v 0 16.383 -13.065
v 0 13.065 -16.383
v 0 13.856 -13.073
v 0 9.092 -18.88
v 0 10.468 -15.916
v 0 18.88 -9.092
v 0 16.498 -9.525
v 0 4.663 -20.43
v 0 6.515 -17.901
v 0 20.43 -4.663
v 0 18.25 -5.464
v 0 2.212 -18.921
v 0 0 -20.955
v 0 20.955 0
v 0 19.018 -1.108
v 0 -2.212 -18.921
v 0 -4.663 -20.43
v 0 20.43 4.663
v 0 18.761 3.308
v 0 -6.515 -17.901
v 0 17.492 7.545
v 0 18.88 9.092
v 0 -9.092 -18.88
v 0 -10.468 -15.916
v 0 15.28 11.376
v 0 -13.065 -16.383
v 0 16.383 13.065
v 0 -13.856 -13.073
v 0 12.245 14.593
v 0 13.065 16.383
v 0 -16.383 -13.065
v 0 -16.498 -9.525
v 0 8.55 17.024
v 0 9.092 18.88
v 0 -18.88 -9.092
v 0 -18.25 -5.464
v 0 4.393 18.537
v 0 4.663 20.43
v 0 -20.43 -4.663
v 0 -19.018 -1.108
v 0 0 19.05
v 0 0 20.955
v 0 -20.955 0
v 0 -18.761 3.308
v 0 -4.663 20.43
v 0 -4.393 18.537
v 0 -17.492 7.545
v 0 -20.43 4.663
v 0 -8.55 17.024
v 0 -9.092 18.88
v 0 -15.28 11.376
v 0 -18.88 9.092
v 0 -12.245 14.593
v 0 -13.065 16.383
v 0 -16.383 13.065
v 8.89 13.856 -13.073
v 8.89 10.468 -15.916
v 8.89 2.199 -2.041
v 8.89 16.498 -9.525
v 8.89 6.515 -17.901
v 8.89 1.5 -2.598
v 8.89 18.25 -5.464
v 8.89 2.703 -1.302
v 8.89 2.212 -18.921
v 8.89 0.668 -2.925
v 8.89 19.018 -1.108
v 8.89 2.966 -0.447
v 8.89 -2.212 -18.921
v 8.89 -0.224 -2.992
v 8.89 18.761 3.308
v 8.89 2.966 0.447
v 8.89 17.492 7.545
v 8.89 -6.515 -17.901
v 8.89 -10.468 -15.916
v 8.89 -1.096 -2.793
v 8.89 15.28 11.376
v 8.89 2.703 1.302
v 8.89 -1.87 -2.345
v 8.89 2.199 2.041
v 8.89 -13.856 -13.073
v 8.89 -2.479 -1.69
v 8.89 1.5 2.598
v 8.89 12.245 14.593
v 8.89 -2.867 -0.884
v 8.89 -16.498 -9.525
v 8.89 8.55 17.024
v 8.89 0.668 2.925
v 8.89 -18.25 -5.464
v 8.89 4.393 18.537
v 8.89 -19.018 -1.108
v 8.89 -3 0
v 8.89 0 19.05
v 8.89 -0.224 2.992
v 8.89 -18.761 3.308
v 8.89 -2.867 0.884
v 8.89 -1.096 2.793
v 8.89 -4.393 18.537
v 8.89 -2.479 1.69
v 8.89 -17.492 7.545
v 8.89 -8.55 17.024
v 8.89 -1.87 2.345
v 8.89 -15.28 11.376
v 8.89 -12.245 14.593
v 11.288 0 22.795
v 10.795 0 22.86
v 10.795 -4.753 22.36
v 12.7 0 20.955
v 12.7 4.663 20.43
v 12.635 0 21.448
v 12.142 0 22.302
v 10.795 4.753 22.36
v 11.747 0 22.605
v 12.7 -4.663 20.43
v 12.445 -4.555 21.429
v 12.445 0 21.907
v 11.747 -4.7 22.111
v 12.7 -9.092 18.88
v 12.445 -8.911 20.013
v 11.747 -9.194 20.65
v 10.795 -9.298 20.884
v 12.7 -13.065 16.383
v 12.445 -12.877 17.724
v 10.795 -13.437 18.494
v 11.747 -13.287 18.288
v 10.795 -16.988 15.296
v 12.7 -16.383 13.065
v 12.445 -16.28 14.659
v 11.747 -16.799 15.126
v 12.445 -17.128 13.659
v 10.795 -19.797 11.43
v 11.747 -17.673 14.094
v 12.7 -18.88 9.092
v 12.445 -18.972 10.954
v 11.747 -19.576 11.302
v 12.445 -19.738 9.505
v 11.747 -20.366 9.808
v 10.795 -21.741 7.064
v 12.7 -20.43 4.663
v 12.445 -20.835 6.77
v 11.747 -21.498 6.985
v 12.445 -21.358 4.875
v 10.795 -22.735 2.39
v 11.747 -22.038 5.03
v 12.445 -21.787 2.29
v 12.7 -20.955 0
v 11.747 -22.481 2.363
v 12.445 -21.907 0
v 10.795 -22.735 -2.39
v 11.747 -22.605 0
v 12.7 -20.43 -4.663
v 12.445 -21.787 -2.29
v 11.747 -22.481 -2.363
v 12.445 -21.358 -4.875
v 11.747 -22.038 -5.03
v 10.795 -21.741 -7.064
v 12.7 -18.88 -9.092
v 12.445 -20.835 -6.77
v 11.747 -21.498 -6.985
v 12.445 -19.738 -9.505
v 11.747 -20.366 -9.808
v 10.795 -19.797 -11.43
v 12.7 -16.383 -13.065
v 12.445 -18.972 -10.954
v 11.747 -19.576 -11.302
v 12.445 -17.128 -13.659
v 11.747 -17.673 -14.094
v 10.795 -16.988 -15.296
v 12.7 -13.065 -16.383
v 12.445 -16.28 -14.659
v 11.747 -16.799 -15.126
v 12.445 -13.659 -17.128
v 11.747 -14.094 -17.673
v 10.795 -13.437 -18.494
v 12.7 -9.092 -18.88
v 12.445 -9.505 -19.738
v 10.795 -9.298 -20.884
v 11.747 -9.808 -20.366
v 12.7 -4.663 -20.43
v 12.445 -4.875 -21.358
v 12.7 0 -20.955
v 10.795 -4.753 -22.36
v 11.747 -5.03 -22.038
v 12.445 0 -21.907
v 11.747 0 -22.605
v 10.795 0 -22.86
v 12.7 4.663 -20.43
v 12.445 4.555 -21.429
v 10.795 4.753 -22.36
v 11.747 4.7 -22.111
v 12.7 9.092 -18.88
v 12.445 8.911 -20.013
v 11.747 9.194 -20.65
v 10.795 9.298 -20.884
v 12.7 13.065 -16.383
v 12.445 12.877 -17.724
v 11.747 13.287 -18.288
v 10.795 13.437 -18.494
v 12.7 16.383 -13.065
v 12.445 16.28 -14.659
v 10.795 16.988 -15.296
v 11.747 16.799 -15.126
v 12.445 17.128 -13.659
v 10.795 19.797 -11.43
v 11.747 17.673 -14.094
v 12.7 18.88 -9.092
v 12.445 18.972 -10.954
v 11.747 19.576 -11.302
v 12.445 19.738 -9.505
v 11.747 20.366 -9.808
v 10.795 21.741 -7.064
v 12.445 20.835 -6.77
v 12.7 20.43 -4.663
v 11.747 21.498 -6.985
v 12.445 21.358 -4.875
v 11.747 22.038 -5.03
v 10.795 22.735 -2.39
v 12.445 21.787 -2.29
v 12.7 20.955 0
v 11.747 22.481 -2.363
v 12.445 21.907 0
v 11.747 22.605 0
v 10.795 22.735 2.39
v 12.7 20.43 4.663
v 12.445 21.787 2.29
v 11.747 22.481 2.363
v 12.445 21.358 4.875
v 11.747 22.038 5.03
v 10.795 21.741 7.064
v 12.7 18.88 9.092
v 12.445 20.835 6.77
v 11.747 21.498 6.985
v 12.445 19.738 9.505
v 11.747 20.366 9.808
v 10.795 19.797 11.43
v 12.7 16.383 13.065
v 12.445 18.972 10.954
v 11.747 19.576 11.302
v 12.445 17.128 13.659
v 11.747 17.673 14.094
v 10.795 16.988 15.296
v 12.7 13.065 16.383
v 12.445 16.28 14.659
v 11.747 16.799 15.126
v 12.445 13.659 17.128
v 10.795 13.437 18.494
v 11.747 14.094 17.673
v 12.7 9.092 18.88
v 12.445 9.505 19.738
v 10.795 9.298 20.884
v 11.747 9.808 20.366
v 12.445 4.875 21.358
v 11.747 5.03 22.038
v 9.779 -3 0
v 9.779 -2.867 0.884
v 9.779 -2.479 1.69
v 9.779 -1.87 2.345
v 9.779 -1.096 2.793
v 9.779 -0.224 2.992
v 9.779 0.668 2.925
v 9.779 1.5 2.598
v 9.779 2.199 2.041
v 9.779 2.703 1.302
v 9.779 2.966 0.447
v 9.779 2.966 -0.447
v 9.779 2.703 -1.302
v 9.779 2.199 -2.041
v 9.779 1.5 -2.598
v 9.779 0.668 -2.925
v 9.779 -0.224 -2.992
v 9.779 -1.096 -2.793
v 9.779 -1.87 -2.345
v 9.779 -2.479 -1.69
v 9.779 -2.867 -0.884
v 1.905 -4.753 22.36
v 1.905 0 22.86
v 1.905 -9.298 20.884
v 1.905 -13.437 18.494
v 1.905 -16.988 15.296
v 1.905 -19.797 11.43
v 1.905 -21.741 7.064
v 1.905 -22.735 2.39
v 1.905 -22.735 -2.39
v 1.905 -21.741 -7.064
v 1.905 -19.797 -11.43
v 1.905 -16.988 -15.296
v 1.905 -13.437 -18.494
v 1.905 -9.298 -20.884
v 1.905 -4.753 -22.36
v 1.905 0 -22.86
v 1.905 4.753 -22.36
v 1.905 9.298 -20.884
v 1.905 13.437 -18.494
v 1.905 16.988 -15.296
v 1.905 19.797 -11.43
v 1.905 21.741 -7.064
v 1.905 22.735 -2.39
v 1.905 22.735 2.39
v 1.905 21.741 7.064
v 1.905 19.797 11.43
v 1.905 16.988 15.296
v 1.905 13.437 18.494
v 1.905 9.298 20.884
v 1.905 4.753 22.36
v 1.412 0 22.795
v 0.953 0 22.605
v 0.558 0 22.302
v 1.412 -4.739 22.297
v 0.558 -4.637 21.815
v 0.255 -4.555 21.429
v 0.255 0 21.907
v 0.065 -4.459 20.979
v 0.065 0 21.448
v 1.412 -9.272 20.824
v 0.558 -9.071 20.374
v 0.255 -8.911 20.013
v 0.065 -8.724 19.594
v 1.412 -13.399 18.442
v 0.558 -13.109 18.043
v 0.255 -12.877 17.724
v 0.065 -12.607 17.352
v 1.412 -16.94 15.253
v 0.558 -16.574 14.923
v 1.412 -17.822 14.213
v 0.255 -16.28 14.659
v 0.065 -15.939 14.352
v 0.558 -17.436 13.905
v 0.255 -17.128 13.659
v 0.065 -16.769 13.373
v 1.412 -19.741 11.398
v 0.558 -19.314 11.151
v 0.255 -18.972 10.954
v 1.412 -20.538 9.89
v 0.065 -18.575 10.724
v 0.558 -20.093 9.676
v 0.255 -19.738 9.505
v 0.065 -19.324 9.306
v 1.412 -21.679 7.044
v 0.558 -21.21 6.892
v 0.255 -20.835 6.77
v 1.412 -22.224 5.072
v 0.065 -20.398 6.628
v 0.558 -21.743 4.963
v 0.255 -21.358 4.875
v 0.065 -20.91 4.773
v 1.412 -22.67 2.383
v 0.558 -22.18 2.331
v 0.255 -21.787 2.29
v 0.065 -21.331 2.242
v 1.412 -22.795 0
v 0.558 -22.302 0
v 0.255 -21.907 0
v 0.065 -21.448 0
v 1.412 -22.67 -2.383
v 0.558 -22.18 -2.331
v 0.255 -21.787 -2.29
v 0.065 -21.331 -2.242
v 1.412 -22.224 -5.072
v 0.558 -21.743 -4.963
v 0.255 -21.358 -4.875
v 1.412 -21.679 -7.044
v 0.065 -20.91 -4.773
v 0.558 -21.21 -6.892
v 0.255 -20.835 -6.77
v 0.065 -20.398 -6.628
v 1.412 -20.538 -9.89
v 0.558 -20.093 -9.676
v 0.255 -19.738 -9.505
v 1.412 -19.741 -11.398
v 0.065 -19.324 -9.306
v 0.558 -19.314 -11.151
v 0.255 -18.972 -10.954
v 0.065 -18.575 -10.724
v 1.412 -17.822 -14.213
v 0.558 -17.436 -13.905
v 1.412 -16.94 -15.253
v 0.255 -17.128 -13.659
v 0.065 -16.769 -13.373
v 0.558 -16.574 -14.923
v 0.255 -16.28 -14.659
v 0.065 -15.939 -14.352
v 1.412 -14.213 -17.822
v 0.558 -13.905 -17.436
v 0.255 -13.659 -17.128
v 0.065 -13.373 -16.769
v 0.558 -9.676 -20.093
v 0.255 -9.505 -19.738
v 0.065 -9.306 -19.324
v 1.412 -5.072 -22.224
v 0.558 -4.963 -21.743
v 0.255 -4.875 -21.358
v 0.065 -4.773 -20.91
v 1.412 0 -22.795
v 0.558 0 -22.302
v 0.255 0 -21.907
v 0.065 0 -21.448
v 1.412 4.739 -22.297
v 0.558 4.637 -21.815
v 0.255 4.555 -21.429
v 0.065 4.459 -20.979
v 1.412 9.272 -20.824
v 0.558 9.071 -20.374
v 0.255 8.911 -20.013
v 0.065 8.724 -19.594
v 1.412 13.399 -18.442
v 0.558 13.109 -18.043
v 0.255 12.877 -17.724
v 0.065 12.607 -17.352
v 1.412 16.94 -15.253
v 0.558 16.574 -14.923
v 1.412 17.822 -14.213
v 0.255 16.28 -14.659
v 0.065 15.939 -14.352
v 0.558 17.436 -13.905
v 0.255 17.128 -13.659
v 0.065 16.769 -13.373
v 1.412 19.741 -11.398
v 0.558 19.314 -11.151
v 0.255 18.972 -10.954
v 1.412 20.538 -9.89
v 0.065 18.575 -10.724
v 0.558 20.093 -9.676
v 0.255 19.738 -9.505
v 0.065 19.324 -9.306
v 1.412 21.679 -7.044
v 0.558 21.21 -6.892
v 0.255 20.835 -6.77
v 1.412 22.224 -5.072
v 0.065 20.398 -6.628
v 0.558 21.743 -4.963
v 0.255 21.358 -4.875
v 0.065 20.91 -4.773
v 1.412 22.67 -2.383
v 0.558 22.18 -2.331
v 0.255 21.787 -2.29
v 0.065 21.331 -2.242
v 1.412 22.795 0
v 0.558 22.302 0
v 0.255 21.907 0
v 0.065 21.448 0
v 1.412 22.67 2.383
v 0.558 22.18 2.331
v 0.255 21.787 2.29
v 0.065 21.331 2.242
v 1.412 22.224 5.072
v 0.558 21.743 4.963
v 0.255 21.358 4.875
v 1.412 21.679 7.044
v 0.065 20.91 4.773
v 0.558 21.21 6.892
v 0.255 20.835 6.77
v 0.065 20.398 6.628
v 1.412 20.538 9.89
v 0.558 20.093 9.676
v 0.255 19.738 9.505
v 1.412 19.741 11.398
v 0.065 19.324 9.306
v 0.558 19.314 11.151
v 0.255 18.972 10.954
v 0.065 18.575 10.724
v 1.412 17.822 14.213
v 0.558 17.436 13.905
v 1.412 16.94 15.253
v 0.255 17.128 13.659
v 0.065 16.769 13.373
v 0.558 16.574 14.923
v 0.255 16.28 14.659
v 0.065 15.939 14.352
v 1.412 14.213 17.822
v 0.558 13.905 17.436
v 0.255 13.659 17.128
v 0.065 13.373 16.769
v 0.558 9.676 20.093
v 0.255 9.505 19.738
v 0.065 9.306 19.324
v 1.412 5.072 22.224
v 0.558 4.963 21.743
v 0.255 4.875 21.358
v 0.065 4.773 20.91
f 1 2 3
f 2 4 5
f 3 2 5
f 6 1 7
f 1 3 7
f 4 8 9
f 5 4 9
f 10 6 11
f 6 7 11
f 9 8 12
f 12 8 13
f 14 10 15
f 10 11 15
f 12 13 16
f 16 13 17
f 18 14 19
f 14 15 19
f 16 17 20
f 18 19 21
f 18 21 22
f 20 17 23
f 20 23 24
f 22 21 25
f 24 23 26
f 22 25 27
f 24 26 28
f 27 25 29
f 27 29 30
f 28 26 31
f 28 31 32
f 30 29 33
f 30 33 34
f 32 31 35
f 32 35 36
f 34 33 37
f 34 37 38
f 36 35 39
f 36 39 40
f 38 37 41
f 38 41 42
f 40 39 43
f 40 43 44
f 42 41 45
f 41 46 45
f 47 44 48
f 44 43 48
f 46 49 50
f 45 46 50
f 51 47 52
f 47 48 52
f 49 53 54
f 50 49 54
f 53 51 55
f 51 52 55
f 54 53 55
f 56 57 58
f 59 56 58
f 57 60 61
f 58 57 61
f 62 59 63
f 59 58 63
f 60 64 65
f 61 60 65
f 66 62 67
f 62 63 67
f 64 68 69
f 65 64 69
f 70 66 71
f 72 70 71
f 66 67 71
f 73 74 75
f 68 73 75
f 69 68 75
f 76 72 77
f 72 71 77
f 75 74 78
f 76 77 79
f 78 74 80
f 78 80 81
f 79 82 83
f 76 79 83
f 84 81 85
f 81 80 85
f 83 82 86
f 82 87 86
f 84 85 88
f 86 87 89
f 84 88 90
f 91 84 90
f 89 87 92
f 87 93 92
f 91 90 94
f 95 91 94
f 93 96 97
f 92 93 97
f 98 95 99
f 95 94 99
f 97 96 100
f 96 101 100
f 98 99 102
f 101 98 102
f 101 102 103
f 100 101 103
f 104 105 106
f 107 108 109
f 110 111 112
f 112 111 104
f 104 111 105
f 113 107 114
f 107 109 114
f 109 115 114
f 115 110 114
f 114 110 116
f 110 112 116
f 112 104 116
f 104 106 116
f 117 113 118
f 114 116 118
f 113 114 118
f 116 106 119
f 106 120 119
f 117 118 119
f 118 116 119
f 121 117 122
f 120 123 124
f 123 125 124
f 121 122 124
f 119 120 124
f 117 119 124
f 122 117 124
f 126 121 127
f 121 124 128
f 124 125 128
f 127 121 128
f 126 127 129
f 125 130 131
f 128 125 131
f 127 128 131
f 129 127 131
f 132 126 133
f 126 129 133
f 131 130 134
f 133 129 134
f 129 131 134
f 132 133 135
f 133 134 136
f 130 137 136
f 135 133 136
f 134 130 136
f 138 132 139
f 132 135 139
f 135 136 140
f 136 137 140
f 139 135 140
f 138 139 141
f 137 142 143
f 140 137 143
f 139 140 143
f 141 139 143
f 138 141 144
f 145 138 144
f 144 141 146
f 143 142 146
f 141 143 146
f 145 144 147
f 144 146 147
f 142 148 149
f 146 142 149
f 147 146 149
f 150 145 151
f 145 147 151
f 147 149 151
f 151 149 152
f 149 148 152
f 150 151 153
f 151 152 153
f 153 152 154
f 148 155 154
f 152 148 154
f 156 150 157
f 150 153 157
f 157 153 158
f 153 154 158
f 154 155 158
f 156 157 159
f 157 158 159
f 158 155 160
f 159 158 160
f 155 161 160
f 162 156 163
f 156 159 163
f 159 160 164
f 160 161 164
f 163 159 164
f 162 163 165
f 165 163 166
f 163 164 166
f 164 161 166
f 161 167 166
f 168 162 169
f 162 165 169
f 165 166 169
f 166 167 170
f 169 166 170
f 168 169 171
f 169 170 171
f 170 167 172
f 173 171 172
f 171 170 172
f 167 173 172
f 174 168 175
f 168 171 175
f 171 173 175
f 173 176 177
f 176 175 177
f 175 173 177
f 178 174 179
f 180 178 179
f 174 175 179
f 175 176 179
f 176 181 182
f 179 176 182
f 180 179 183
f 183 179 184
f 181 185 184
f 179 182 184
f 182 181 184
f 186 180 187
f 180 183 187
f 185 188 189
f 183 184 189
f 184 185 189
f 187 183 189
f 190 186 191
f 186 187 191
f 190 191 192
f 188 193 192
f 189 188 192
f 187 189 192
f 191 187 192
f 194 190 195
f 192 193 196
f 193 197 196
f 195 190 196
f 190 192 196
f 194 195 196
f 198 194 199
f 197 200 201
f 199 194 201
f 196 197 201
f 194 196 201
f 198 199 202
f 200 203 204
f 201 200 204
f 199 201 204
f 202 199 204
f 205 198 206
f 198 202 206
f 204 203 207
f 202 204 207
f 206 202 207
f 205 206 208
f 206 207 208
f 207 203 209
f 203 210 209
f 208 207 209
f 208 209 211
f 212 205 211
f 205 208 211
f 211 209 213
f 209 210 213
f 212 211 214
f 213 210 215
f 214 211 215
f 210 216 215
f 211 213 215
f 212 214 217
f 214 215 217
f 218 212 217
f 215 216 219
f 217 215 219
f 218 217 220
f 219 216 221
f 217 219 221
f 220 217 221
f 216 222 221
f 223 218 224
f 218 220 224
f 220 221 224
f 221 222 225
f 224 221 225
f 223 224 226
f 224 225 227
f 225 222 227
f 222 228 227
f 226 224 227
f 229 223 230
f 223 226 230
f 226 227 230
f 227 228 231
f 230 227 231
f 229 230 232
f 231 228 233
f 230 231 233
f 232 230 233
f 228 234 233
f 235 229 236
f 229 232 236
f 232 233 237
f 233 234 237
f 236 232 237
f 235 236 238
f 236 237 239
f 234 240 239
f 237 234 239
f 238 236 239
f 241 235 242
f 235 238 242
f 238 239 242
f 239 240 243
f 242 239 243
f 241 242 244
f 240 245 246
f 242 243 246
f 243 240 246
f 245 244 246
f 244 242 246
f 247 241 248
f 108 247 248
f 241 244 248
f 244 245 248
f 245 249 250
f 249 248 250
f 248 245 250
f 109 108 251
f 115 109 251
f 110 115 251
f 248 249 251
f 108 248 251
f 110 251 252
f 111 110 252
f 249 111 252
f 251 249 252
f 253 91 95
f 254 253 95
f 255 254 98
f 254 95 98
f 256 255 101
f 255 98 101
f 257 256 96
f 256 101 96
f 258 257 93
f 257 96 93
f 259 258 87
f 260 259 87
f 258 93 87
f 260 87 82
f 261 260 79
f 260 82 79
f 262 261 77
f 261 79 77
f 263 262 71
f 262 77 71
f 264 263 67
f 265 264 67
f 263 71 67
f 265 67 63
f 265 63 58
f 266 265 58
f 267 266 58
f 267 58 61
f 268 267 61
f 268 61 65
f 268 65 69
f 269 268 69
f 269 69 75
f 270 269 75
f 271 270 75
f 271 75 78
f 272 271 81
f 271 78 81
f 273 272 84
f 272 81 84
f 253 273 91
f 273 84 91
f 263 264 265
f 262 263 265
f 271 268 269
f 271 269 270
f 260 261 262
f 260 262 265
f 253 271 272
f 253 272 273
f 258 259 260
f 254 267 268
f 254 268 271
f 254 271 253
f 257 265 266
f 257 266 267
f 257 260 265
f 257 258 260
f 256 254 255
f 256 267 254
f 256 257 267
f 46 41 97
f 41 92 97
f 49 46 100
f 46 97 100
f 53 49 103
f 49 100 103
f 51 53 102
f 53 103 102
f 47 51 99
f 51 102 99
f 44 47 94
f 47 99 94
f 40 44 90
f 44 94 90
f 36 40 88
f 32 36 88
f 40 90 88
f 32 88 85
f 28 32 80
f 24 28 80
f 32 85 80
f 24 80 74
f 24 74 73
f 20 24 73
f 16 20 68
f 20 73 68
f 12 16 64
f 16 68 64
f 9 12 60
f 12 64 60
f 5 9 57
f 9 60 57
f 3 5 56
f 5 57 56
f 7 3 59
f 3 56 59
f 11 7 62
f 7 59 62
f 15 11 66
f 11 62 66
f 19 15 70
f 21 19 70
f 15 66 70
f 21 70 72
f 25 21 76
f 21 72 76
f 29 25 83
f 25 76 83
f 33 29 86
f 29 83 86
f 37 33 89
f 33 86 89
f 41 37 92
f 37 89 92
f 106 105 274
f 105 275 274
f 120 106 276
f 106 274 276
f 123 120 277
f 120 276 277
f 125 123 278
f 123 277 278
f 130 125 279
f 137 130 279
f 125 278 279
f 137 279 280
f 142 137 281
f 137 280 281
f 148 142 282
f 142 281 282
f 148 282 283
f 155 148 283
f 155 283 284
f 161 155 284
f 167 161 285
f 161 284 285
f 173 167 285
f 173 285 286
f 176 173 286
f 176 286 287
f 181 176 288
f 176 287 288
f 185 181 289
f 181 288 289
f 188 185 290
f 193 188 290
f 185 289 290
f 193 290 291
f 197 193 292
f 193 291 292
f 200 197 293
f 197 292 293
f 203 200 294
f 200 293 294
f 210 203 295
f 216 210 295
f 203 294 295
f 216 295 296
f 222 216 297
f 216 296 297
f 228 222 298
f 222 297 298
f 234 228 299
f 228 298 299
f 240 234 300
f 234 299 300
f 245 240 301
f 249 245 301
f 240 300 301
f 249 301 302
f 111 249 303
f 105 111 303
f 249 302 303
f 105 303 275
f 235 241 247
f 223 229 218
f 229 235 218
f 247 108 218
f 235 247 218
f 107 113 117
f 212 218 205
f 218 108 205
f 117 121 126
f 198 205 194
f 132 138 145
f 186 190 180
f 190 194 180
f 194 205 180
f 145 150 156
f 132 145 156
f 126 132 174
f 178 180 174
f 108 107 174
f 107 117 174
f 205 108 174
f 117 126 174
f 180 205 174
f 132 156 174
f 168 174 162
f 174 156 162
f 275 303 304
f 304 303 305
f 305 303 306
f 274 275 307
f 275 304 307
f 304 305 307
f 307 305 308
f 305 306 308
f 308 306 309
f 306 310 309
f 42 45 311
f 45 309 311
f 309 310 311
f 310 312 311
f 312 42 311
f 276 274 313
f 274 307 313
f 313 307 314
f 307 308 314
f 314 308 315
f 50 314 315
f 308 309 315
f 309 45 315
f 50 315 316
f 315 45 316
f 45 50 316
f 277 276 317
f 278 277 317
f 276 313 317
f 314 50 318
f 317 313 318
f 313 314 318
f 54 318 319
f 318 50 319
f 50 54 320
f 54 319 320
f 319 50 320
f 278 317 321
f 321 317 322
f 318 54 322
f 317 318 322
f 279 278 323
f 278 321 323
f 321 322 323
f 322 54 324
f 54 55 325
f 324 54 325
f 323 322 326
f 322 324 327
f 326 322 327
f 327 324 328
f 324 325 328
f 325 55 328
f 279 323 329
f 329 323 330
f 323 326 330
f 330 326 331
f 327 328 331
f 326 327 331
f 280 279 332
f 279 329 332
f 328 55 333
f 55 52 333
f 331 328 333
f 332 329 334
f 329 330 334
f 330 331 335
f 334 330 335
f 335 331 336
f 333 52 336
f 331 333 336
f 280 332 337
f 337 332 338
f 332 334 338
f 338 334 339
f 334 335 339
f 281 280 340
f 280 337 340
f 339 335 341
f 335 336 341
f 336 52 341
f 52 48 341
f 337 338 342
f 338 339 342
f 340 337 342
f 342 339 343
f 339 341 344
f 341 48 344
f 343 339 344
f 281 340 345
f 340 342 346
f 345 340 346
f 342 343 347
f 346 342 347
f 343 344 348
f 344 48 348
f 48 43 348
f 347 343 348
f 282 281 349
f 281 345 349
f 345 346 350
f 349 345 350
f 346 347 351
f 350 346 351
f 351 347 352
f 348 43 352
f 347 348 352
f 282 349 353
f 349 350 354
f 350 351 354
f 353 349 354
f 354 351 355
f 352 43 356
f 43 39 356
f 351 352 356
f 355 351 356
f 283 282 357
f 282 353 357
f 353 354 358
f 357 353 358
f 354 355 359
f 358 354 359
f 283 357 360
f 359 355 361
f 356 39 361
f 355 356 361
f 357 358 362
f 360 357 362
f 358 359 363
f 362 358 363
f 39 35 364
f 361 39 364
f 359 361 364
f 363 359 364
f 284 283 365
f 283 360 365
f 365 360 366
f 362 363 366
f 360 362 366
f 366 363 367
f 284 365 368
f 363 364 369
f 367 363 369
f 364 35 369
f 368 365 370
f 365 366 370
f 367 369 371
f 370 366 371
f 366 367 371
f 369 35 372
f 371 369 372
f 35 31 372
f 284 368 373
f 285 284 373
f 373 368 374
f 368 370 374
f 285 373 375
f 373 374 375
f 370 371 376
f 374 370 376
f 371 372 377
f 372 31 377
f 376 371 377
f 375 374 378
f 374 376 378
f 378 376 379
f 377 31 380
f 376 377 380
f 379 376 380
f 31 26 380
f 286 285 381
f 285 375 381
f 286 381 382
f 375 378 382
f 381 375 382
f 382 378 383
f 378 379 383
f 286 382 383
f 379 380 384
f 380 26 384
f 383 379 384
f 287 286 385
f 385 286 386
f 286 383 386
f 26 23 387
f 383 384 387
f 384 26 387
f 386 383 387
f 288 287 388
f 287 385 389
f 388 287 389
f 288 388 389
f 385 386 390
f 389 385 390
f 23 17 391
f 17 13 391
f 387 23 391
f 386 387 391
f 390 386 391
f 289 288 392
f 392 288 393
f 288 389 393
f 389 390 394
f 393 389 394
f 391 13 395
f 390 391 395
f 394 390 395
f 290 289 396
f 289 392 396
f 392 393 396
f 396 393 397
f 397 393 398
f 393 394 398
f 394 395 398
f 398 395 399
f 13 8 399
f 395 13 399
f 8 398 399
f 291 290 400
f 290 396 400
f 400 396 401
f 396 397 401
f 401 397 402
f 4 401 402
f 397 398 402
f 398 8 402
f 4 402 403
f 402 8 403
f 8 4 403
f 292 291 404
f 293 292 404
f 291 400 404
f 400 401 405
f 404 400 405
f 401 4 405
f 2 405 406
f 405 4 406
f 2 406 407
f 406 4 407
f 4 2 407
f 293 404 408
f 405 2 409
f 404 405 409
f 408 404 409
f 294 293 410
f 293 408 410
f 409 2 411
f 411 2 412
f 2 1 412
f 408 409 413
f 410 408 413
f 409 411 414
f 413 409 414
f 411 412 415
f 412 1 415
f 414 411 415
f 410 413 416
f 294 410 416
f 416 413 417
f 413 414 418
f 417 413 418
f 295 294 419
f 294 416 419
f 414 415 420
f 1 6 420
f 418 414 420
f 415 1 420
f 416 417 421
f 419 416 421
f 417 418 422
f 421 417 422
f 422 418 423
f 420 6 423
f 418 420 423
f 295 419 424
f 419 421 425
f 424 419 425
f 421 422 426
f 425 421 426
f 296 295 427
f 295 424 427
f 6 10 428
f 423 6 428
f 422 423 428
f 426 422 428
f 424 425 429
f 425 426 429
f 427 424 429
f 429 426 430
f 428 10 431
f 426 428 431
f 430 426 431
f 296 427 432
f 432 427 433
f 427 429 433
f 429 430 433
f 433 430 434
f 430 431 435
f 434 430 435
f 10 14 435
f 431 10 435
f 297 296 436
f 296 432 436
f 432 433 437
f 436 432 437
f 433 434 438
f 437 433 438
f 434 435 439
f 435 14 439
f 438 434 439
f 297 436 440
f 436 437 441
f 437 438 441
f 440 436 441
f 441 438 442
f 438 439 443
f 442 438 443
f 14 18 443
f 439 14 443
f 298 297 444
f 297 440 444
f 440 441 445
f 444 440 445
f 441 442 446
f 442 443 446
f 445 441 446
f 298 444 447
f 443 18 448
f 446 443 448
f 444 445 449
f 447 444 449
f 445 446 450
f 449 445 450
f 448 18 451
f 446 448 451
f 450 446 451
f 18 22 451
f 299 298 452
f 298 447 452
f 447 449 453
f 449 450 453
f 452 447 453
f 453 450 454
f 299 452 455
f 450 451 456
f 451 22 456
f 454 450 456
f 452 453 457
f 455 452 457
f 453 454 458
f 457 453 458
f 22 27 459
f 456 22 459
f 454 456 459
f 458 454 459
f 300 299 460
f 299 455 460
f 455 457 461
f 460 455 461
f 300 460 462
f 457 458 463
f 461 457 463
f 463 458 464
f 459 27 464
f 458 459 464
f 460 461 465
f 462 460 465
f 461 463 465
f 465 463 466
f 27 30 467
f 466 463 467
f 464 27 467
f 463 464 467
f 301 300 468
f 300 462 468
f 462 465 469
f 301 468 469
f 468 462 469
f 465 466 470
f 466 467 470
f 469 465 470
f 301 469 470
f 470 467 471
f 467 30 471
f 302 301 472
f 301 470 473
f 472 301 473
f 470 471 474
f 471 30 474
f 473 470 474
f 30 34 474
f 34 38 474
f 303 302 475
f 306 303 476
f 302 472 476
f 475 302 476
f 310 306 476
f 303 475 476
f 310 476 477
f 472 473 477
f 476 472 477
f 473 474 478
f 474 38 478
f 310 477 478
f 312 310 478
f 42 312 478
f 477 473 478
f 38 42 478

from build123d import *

# Parameters (mm, degrees)
F2_R     = 3
F3_DEPTH = 0.889


with BuildPart() as f1:
    # F0 (on Front) → F1 (revolve)
    with BuildSketch(Plane.XZ):
        with BuildLine():
            Line((0, 20.955), (0, 19.05))
            Line((0, 19.05), (8.89, 19.05))
            Line((8.89, 19.05), (8.89, 0))
            Line((8.89, 0), (12.7, 0))
            Line((12.7, 0), (12.7, 20.955))
            ThreePointArc((12.7, 20.955), (12.142038, 22.302038), (10.795, 22.86))
            Line((10.795, 22.86), (1.905, 22.86))
            ThreePointArc((1.905, 22.86), (0.557962, 22.302038), (0, 20.955))
        make_face()
    revolve(axis=Axis((2.430882, 0, 0), (1, 0, 0)))

    # F2 (on face) → F3 (cut)
    with BuildSketch(Plane(origin=(8.89, 0, 0), x_dir=(0, -1, 0), z_dir=(-1, 0, 0))):
        Circle(F2_R)
    extrude(amount=-F3_DEPTH, mode=Mode.SUBTRACT)


solid = f1.part
